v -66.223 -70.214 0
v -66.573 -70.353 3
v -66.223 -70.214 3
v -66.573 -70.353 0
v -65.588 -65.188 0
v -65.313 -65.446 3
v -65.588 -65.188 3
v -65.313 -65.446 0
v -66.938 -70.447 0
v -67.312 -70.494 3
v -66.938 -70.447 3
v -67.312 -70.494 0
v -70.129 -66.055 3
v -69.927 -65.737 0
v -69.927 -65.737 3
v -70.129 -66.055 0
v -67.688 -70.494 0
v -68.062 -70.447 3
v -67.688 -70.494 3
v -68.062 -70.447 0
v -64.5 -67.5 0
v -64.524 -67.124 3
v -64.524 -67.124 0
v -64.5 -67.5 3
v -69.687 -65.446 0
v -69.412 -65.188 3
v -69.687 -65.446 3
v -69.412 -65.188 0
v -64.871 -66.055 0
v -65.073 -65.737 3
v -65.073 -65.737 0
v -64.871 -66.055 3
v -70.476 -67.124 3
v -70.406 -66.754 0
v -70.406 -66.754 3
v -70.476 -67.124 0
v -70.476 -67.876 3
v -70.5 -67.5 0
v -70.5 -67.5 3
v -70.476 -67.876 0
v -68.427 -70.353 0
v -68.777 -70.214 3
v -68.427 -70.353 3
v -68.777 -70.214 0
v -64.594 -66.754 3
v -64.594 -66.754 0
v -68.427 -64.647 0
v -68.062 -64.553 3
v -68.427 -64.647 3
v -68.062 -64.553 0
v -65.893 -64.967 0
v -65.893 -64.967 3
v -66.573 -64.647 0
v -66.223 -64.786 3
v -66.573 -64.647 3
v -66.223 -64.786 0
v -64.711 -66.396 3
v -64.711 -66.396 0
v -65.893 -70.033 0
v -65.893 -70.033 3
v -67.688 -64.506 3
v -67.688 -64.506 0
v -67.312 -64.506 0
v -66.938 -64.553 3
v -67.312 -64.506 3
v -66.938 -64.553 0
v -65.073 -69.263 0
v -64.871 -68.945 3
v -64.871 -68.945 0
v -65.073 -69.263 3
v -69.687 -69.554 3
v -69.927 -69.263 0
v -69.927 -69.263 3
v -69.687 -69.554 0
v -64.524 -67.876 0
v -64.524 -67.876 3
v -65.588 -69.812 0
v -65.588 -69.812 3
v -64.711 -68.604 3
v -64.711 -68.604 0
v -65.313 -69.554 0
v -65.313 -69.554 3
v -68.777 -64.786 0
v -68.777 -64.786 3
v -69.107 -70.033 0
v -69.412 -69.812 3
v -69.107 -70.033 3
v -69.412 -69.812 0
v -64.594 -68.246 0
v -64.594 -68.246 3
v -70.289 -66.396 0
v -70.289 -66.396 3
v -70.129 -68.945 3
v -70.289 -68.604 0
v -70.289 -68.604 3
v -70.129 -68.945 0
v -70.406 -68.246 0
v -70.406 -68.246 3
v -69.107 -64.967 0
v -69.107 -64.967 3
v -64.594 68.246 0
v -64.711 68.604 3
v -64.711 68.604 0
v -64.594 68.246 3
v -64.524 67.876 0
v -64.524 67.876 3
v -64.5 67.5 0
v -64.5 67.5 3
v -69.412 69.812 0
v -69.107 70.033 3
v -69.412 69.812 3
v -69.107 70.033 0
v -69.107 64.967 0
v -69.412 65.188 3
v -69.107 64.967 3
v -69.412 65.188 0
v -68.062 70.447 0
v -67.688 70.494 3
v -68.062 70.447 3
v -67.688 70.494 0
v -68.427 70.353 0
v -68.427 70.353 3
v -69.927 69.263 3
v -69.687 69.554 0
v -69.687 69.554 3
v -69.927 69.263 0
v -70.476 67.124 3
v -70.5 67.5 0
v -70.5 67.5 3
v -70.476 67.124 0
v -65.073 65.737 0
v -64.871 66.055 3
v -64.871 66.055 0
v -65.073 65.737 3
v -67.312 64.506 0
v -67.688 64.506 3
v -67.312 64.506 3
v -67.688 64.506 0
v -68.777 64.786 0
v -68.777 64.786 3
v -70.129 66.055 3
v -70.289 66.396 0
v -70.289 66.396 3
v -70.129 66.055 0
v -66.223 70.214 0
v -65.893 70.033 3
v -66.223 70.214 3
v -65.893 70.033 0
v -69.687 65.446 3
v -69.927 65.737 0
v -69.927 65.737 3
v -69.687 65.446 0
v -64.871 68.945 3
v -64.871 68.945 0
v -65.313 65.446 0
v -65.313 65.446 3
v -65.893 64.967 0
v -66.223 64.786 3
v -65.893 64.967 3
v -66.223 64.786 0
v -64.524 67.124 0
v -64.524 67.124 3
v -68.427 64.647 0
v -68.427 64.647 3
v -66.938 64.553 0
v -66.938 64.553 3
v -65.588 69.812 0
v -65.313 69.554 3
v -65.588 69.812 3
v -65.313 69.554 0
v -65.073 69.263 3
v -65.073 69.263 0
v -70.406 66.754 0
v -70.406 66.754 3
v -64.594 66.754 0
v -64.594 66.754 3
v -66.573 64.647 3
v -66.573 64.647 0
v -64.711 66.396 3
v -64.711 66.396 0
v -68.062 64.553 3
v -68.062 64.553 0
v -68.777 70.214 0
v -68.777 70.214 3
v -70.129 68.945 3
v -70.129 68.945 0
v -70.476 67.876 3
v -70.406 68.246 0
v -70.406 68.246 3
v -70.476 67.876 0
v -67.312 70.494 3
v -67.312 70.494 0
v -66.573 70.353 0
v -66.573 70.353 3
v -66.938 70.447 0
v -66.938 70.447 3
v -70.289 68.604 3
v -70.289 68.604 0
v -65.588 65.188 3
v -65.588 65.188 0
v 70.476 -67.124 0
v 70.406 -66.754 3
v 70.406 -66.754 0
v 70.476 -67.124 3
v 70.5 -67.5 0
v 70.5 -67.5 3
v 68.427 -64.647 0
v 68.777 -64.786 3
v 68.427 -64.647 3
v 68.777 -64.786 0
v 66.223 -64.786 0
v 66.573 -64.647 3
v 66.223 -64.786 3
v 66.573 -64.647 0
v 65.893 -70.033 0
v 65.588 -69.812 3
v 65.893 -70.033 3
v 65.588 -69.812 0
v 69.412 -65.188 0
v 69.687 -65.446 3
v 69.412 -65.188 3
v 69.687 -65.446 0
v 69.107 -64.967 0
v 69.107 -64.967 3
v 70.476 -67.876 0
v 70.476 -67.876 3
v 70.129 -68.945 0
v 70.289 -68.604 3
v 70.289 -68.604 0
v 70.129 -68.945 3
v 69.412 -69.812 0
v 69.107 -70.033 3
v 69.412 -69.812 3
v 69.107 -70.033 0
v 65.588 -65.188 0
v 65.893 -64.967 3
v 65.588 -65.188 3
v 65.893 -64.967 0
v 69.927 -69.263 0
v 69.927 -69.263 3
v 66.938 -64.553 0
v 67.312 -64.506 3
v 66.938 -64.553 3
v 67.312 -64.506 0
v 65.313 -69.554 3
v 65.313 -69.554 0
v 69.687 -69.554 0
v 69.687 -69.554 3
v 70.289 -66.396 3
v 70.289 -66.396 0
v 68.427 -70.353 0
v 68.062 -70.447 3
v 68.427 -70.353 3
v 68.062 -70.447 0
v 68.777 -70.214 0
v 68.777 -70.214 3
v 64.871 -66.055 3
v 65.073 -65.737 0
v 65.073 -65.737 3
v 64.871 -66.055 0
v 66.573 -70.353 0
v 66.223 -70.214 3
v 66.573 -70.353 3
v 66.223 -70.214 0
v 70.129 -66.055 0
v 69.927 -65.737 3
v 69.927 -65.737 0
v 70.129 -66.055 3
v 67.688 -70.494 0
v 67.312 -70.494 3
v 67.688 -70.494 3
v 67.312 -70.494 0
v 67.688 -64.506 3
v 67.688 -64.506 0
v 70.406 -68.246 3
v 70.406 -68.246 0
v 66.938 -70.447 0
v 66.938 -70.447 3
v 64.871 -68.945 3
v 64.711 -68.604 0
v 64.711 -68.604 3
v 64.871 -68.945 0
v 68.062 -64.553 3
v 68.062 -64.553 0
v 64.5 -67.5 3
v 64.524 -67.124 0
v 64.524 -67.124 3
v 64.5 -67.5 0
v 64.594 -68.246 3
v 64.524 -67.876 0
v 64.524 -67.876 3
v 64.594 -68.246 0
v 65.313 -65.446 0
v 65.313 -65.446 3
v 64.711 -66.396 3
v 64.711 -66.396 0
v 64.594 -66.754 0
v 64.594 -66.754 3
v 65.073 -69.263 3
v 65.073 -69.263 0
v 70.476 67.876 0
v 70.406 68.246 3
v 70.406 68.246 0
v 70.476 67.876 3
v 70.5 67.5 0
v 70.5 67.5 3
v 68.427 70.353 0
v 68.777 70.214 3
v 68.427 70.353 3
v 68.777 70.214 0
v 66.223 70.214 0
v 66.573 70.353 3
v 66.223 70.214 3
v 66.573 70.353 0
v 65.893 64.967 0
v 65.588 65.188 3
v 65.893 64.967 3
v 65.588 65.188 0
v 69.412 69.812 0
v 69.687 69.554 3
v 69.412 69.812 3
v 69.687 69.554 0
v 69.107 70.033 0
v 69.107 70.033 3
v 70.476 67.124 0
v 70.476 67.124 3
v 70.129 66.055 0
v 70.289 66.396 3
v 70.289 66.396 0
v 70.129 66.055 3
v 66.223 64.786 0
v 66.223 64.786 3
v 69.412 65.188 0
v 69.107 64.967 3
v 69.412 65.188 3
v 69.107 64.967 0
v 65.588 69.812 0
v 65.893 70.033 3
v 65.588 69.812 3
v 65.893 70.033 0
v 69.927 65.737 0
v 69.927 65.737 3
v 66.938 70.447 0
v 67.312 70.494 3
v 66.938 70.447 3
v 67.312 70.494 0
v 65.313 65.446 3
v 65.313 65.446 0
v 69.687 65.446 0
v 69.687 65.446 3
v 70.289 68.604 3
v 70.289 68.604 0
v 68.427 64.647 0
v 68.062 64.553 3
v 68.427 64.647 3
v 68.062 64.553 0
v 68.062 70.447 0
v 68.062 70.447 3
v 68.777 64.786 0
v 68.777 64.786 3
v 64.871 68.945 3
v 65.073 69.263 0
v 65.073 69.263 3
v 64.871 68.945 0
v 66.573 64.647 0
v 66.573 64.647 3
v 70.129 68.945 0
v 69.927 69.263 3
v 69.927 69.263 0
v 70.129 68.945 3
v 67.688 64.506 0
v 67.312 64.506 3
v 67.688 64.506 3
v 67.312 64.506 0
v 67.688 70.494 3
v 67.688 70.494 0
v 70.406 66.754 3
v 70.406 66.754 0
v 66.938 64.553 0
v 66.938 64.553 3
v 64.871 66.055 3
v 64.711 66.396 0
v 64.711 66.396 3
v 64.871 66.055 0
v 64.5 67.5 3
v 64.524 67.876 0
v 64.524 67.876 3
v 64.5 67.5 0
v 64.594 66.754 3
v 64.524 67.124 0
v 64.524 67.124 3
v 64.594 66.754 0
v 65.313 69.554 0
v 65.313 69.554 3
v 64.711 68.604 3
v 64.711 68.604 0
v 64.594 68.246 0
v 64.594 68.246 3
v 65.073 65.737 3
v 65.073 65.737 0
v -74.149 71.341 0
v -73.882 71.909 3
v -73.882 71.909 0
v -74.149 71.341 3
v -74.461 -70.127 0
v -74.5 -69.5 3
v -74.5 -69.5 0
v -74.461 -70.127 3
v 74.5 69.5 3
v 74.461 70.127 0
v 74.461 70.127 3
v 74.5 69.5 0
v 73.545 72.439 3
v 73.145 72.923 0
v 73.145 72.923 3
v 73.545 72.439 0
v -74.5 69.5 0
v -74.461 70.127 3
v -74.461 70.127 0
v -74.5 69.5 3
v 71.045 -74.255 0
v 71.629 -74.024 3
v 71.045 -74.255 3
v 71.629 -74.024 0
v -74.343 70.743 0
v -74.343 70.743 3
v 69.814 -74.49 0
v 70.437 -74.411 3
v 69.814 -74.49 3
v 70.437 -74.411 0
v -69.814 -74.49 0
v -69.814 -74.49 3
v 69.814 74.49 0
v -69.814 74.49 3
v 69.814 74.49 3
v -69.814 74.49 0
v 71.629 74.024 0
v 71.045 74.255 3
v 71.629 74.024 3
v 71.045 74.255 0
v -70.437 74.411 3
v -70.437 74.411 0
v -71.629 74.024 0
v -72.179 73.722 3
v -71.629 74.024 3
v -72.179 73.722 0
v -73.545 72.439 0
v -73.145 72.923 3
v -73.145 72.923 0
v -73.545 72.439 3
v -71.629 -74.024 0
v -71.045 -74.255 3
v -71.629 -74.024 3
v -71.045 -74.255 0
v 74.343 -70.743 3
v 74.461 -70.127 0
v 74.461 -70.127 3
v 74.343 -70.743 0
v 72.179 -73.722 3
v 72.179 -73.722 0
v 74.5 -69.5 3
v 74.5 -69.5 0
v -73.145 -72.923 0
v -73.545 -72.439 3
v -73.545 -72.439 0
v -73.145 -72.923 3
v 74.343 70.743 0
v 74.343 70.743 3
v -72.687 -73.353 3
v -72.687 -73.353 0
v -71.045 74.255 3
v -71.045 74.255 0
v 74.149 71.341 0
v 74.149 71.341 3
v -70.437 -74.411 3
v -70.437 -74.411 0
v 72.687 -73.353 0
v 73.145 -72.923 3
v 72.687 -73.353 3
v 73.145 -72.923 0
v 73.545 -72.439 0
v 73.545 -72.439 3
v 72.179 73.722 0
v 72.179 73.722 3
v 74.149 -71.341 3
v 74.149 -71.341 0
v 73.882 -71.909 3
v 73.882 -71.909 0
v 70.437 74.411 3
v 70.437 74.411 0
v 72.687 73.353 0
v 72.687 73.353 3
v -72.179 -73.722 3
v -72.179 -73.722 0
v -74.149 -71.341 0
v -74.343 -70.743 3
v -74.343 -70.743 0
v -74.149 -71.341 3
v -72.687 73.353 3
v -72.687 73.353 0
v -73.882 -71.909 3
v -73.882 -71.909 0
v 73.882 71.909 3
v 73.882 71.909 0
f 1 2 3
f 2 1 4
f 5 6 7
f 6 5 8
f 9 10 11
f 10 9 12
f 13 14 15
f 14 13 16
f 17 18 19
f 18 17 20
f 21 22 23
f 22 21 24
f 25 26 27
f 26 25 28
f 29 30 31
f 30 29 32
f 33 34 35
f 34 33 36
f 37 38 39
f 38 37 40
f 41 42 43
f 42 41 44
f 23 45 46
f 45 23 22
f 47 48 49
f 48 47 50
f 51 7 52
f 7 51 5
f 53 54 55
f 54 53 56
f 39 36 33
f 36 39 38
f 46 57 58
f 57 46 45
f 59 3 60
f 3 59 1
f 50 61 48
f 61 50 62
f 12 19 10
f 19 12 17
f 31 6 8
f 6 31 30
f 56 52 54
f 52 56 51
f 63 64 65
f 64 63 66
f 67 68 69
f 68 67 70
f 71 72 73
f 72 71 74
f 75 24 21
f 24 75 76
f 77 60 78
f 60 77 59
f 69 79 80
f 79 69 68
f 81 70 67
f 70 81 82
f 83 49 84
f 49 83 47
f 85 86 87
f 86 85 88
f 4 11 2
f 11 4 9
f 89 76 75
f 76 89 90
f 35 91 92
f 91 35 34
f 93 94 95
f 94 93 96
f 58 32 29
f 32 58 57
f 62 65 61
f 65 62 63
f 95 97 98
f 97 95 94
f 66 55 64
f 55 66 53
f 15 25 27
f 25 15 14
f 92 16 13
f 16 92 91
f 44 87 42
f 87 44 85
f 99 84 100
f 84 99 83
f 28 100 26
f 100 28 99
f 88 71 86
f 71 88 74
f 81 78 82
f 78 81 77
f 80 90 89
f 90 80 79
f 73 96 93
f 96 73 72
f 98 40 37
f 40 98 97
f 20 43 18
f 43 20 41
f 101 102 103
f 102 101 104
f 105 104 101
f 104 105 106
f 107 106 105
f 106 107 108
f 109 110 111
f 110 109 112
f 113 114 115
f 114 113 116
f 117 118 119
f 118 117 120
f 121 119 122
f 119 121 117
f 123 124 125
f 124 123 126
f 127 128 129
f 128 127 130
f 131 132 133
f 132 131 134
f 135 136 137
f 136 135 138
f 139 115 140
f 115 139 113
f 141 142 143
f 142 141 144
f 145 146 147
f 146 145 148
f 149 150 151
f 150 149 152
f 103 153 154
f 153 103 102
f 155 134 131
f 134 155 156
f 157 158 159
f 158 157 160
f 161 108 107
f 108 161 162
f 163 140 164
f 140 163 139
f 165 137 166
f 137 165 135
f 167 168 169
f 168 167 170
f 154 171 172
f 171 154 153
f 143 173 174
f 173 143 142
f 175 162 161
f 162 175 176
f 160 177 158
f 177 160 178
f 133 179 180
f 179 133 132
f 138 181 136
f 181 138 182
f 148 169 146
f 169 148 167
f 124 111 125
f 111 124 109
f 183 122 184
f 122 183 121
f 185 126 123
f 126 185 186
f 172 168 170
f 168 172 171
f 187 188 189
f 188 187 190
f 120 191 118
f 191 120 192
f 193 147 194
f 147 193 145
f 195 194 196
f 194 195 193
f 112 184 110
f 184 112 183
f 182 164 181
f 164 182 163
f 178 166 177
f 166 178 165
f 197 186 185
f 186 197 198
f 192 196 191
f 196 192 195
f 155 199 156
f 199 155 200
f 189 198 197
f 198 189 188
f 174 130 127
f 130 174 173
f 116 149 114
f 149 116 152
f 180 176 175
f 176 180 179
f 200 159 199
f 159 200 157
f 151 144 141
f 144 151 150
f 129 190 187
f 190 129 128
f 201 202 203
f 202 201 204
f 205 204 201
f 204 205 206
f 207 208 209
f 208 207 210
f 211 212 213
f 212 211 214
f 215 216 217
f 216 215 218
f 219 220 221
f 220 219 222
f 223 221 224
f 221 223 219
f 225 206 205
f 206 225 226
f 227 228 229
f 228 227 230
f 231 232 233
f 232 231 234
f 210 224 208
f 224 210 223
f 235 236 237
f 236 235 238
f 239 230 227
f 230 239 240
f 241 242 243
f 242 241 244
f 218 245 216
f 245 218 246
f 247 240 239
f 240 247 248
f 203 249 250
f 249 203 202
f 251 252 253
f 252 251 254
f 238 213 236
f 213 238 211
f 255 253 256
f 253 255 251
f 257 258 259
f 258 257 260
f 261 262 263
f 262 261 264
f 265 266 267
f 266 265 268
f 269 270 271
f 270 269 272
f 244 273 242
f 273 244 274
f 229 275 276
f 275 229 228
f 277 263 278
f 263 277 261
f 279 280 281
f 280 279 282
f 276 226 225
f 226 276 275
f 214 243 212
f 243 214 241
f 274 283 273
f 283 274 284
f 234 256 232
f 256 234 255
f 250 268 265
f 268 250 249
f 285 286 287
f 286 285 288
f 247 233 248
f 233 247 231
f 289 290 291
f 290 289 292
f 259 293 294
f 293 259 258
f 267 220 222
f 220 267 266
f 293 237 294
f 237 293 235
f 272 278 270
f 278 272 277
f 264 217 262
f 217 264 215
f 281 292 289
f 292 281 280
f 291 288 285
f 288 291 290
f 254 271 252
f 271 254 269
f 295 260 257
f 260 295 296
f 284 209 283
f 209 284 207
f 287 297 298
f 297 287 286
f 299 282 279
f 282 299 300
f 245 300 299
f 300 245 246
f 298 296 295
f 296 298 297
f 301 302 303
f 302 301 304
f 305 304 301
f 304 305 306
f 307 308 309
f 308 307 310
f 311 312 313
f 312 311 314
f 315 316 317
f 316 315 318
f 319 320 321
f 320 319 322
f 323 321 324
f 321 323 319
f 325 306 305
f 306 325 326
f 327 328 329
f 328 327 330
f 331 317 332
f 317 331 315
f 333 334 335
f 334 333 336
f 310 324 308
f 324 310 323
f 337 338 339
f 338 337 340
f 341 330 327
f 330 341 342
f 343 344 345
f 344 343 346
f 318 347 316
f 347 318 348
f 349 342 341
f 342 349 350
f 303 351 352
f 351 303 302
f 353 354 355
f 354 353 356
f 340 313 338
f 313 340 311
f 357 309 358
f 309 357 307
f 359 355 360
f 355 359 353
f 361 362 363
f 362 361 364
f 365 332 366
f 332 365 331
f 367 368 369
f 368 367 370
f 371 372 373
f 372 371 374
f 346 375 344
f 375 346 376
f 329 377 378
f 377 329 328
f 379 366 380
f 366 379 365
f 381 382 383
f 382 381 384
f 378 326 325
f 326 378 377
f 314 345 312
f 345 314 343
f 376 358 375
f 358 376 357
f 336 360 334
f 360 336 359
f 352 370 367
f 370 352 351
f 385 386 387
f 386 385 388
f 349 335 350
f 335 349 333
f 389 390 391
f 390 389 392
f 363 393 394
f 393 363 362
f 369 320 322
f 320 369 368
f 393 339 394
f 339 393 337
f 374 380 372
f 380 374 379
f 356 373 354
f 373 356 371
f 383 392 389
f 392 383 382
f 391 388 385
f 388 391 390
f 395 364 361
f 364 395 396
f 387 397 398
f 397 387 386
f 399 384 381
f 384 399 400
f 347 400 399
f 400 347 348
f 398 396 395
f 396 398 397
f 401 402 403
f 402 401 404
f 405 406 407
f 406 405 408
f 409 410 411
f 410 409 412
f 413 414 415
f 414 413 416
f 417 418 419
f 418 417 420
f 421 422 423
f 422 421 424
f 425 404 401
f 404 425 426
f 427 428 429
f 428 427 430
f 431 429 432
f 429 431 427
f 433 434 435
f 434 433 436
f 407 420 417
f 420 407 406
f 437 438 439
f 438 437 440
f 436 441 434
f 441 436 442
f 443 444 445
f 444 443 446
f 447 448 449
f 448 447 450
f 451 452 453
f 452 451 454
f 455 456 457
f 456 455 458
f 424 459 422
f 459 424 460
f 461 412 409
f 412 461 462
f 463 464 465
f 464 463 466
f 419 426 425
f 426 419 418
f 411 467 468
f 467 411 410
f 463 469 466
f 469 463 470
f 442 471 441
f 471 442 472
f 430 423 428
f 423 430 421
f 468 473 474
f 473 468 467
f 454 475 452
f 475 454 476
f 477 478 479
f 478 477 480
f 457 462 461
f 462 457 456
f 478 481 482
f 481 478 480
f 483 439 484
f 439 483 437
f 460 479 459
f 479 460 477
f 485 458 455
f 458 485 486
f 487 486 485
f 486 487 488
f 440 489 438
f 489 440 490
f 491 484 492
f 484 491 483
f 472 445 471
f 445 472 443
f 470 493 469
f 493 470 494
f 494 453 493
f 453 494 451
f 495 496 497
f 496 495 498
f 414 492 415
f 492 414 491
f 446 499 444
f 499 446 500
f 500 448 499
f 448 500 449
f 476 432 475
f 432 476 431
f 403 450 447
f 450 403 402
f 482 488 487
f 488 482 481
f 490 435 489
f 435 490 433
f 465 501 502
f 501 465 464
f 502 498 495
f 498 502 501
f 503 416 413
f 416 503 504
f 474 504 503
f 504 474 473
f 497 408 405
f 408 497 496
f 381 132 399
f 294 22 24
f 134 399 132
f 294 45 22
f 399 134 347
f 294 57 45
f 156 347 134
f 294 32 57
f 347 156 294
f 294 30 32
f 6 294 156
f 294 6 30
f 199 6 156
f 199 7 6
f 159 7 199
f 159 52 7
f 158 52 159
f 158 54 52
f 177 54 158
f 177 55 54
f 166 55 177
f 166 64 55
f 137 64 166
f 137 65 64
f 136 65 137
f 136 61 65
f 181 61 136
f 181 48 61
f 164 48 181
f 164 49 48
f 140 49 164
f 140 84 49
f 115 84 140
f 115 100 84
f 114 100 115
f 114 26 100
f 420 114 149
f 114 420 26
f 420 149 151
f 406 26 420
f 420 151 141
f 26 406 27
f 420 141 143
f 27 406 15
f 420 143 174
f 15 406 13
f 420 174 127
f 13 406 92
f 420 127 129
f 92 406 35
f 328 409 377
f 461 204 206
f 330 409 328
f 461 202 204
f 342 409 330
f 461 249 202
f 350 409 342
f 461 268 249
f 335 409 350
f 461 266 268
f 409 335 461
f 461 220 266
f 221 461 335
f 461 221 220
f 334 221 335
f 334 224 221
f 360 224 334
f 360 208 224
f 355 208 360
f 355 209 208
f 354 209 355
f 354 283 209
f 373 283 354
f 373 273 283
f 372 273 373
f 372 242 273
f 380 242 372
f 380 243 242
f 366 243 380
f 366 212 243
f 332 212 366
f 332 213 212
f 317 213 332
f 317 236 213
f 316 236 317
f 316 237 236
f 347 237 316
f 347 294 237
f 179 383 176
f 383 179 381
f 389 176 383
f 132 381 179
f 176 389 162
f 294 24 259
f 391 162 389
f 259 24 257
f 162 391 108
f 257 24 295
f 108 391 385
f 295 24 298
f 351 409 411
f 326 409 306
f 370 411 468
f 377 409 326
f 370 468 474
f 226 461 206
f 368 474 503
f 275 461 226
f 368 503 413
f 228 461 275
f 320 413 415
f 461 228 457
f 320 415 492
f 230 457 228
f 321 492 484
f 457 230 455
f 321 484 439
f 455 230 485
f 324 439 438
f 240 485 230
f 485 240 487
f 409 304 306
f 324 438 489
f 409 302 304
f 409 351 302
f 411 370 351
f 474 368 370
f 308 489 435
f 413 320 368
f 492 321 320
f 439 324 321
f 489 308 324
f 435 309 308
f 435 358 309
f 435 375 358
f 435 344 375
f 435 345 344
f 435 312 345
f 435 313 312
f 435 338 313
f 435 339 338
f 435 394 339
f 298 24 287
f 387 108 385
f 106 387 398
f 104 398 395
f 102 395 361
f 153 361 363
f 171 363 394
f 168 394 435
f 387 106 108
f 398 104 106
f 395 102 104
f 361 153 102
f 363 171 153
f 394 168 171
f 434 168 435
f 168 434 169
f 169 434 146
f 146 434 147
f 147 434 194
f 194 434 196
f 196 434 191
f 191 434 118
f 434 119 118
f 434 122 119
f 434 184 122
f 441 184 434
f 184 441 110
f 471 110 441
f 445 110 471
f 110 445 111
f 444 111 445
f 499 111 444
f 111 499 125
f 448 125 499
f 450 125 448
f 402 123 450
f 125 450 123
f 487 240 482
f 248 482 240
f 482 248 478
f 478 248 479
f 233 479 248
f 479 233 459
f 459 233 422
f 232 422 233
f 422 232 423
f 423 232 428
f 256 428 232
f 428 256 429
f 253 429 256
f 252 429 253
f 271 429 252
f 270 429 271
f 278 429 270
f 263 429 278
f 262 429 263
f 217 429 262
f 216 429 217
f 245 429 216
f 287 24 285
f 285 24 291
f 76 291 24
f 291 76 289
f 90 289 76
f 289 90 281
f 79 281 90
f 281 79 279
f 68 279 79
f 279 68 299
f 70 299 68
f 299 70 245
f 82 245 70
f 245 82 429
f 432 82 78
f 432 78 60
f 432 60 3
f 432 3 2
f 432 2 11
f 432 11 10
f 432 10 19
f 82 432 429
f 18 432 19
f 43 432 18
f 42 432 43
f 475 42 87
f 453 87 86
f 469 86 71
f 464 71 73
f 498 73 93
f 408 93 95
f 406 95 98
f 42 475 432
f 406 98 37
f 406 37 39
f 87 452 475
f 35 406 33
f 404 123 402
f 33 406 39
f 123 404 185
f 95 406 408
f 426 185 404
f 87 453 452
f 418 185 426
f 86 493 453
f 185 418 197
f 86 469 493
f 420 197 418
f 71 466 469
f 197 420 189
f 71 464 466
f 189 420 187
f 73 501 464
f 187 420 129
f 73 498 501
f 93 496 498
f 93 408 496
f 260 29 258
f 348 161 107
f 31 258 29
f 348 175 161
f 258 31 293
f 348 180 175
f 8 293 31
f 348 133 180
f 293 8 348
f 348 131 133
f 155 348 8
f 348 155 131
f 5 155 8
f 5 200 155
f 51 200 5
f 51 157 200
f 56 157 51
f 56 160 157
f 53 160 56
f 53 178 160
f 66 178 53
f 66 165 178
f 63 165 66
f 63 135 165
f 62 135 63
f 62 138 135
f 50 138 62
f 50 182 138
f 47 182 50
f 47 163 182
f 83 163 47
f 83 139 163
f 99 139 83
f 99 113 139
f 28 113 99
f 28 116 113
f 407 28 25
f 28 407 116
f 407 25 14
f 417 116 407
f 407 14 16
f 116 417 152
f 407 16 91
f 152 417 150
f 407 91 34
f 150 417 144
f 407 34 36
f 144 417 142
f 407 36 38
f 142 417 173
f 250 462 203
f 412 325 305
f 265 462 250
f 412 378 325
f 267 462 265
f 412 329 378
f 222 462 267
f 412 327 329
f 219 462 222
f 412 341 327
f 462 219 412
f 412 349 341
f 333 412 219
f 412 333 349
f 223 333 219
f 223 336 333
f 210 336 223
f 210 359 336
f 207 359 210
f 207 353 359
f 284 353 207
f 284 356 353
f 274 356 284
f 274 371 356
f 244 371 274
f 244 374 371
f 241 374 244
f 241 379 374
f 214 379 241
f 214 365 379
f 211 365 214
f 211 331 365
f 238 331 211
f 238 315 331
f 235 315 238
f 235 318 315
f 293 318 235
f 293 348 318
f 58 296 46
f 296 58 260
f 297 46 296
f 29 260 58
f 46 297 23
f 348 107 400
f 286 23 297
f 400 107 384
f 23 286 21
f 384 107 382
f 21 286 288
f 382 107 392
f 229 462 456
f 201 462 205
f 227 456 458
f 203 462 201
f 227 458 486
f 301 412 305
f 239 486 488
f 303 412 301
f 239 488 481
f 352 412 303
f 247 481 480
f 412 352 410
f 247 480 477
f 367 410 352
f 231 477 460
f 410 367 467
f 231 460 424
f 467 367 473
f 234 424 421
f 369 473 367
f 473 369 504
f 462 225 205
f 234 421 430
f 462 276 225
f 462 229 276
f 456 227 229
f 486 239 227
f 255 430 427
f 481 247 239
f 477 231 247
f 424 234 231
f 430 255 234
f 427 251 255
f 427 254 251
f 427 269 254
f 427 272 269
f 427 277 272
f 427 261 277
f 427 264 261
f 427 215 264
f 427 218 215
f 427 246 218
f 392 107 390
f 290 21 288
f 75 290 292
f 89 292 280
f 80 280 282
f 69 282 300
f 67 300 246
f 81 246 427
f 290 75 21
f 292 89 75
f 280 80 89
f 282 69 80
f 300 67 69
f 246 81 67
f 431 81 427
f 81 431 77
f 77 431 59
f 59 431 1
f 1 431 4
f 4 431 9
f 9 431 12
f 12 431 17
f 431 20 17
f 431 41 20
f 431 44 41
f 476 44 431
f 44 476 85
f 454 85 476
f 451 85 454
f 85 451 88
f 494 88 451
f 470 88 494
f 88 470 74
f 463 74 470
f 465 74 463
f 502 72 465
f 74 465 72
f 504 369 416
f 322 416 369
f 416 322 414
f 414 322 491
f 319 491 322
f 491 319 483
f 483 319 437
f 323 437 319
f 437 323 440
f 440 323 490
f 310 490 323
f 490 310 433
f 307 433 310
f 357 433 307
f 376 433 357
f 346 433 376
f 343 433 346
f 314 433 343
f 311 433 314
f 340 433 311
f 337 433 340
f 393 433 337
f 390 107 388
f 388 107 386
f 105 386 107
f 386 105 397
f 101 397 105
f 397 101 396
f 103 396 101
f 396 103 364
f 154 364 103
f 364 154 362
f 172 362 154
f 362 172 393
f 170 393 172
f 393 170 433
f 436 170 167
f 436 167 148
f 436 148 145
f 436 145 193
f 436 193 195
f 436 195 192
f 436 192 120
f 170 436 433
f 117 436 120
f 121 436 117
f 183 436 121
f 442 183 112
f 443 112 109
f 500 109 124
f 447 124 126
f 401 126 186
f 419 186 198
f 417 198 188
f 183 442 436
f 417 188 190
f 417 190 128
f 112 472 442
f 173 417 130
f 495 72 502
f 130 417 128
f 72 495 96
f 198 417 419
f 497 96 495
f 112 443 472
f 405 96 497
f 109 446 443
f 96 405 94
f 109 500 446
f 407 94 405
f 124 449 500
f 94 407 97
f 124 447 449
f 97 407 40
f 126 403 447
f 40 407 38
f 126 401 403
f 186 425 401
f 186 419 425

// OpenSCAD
$fn = 50;


difference() {
	union() {
		hull() {
			translate(v = [-69.5000000000, 69.5000000000, 0]) {
				cylinder(h = 3, r = 5);
			}
			translate(v = [69.5000000000, 69.5000000000, 0]) {
				cylinder(h = 3, r = 5);
			}
			translate(v = [-69.5000000000, -69.5000000000, 0]) {
				cylinder(h = 3, r = 5);
			}
			translate(v = [69.5000000000, -69.5000000000, 0]) {
				cylinder(h = 3, r = 5);
			}
		}
	}
	union() {
		translate(v = [-67.5000000000, -67.5000000000, -100.0000000000]) {
			cylinder(h = 200, r = 3.0000000000);
		}
		translate(v = [-67.5000000000, 67.5000000000, -100.0000000000]) {
			cylinder(h = 200, r = 3.0000000000);
		}
		translate(v = [67.5000000000, -67.5000000000, -100.0000000000]) {
			cylinder(h = 200, r = 3.0000000000);
		}
		translate(v = [67.5000000000, 67.5000000000, -100.0000000000]) {
			cylinder(h = 200, r = 3.0000000000);
		}
	}
}
